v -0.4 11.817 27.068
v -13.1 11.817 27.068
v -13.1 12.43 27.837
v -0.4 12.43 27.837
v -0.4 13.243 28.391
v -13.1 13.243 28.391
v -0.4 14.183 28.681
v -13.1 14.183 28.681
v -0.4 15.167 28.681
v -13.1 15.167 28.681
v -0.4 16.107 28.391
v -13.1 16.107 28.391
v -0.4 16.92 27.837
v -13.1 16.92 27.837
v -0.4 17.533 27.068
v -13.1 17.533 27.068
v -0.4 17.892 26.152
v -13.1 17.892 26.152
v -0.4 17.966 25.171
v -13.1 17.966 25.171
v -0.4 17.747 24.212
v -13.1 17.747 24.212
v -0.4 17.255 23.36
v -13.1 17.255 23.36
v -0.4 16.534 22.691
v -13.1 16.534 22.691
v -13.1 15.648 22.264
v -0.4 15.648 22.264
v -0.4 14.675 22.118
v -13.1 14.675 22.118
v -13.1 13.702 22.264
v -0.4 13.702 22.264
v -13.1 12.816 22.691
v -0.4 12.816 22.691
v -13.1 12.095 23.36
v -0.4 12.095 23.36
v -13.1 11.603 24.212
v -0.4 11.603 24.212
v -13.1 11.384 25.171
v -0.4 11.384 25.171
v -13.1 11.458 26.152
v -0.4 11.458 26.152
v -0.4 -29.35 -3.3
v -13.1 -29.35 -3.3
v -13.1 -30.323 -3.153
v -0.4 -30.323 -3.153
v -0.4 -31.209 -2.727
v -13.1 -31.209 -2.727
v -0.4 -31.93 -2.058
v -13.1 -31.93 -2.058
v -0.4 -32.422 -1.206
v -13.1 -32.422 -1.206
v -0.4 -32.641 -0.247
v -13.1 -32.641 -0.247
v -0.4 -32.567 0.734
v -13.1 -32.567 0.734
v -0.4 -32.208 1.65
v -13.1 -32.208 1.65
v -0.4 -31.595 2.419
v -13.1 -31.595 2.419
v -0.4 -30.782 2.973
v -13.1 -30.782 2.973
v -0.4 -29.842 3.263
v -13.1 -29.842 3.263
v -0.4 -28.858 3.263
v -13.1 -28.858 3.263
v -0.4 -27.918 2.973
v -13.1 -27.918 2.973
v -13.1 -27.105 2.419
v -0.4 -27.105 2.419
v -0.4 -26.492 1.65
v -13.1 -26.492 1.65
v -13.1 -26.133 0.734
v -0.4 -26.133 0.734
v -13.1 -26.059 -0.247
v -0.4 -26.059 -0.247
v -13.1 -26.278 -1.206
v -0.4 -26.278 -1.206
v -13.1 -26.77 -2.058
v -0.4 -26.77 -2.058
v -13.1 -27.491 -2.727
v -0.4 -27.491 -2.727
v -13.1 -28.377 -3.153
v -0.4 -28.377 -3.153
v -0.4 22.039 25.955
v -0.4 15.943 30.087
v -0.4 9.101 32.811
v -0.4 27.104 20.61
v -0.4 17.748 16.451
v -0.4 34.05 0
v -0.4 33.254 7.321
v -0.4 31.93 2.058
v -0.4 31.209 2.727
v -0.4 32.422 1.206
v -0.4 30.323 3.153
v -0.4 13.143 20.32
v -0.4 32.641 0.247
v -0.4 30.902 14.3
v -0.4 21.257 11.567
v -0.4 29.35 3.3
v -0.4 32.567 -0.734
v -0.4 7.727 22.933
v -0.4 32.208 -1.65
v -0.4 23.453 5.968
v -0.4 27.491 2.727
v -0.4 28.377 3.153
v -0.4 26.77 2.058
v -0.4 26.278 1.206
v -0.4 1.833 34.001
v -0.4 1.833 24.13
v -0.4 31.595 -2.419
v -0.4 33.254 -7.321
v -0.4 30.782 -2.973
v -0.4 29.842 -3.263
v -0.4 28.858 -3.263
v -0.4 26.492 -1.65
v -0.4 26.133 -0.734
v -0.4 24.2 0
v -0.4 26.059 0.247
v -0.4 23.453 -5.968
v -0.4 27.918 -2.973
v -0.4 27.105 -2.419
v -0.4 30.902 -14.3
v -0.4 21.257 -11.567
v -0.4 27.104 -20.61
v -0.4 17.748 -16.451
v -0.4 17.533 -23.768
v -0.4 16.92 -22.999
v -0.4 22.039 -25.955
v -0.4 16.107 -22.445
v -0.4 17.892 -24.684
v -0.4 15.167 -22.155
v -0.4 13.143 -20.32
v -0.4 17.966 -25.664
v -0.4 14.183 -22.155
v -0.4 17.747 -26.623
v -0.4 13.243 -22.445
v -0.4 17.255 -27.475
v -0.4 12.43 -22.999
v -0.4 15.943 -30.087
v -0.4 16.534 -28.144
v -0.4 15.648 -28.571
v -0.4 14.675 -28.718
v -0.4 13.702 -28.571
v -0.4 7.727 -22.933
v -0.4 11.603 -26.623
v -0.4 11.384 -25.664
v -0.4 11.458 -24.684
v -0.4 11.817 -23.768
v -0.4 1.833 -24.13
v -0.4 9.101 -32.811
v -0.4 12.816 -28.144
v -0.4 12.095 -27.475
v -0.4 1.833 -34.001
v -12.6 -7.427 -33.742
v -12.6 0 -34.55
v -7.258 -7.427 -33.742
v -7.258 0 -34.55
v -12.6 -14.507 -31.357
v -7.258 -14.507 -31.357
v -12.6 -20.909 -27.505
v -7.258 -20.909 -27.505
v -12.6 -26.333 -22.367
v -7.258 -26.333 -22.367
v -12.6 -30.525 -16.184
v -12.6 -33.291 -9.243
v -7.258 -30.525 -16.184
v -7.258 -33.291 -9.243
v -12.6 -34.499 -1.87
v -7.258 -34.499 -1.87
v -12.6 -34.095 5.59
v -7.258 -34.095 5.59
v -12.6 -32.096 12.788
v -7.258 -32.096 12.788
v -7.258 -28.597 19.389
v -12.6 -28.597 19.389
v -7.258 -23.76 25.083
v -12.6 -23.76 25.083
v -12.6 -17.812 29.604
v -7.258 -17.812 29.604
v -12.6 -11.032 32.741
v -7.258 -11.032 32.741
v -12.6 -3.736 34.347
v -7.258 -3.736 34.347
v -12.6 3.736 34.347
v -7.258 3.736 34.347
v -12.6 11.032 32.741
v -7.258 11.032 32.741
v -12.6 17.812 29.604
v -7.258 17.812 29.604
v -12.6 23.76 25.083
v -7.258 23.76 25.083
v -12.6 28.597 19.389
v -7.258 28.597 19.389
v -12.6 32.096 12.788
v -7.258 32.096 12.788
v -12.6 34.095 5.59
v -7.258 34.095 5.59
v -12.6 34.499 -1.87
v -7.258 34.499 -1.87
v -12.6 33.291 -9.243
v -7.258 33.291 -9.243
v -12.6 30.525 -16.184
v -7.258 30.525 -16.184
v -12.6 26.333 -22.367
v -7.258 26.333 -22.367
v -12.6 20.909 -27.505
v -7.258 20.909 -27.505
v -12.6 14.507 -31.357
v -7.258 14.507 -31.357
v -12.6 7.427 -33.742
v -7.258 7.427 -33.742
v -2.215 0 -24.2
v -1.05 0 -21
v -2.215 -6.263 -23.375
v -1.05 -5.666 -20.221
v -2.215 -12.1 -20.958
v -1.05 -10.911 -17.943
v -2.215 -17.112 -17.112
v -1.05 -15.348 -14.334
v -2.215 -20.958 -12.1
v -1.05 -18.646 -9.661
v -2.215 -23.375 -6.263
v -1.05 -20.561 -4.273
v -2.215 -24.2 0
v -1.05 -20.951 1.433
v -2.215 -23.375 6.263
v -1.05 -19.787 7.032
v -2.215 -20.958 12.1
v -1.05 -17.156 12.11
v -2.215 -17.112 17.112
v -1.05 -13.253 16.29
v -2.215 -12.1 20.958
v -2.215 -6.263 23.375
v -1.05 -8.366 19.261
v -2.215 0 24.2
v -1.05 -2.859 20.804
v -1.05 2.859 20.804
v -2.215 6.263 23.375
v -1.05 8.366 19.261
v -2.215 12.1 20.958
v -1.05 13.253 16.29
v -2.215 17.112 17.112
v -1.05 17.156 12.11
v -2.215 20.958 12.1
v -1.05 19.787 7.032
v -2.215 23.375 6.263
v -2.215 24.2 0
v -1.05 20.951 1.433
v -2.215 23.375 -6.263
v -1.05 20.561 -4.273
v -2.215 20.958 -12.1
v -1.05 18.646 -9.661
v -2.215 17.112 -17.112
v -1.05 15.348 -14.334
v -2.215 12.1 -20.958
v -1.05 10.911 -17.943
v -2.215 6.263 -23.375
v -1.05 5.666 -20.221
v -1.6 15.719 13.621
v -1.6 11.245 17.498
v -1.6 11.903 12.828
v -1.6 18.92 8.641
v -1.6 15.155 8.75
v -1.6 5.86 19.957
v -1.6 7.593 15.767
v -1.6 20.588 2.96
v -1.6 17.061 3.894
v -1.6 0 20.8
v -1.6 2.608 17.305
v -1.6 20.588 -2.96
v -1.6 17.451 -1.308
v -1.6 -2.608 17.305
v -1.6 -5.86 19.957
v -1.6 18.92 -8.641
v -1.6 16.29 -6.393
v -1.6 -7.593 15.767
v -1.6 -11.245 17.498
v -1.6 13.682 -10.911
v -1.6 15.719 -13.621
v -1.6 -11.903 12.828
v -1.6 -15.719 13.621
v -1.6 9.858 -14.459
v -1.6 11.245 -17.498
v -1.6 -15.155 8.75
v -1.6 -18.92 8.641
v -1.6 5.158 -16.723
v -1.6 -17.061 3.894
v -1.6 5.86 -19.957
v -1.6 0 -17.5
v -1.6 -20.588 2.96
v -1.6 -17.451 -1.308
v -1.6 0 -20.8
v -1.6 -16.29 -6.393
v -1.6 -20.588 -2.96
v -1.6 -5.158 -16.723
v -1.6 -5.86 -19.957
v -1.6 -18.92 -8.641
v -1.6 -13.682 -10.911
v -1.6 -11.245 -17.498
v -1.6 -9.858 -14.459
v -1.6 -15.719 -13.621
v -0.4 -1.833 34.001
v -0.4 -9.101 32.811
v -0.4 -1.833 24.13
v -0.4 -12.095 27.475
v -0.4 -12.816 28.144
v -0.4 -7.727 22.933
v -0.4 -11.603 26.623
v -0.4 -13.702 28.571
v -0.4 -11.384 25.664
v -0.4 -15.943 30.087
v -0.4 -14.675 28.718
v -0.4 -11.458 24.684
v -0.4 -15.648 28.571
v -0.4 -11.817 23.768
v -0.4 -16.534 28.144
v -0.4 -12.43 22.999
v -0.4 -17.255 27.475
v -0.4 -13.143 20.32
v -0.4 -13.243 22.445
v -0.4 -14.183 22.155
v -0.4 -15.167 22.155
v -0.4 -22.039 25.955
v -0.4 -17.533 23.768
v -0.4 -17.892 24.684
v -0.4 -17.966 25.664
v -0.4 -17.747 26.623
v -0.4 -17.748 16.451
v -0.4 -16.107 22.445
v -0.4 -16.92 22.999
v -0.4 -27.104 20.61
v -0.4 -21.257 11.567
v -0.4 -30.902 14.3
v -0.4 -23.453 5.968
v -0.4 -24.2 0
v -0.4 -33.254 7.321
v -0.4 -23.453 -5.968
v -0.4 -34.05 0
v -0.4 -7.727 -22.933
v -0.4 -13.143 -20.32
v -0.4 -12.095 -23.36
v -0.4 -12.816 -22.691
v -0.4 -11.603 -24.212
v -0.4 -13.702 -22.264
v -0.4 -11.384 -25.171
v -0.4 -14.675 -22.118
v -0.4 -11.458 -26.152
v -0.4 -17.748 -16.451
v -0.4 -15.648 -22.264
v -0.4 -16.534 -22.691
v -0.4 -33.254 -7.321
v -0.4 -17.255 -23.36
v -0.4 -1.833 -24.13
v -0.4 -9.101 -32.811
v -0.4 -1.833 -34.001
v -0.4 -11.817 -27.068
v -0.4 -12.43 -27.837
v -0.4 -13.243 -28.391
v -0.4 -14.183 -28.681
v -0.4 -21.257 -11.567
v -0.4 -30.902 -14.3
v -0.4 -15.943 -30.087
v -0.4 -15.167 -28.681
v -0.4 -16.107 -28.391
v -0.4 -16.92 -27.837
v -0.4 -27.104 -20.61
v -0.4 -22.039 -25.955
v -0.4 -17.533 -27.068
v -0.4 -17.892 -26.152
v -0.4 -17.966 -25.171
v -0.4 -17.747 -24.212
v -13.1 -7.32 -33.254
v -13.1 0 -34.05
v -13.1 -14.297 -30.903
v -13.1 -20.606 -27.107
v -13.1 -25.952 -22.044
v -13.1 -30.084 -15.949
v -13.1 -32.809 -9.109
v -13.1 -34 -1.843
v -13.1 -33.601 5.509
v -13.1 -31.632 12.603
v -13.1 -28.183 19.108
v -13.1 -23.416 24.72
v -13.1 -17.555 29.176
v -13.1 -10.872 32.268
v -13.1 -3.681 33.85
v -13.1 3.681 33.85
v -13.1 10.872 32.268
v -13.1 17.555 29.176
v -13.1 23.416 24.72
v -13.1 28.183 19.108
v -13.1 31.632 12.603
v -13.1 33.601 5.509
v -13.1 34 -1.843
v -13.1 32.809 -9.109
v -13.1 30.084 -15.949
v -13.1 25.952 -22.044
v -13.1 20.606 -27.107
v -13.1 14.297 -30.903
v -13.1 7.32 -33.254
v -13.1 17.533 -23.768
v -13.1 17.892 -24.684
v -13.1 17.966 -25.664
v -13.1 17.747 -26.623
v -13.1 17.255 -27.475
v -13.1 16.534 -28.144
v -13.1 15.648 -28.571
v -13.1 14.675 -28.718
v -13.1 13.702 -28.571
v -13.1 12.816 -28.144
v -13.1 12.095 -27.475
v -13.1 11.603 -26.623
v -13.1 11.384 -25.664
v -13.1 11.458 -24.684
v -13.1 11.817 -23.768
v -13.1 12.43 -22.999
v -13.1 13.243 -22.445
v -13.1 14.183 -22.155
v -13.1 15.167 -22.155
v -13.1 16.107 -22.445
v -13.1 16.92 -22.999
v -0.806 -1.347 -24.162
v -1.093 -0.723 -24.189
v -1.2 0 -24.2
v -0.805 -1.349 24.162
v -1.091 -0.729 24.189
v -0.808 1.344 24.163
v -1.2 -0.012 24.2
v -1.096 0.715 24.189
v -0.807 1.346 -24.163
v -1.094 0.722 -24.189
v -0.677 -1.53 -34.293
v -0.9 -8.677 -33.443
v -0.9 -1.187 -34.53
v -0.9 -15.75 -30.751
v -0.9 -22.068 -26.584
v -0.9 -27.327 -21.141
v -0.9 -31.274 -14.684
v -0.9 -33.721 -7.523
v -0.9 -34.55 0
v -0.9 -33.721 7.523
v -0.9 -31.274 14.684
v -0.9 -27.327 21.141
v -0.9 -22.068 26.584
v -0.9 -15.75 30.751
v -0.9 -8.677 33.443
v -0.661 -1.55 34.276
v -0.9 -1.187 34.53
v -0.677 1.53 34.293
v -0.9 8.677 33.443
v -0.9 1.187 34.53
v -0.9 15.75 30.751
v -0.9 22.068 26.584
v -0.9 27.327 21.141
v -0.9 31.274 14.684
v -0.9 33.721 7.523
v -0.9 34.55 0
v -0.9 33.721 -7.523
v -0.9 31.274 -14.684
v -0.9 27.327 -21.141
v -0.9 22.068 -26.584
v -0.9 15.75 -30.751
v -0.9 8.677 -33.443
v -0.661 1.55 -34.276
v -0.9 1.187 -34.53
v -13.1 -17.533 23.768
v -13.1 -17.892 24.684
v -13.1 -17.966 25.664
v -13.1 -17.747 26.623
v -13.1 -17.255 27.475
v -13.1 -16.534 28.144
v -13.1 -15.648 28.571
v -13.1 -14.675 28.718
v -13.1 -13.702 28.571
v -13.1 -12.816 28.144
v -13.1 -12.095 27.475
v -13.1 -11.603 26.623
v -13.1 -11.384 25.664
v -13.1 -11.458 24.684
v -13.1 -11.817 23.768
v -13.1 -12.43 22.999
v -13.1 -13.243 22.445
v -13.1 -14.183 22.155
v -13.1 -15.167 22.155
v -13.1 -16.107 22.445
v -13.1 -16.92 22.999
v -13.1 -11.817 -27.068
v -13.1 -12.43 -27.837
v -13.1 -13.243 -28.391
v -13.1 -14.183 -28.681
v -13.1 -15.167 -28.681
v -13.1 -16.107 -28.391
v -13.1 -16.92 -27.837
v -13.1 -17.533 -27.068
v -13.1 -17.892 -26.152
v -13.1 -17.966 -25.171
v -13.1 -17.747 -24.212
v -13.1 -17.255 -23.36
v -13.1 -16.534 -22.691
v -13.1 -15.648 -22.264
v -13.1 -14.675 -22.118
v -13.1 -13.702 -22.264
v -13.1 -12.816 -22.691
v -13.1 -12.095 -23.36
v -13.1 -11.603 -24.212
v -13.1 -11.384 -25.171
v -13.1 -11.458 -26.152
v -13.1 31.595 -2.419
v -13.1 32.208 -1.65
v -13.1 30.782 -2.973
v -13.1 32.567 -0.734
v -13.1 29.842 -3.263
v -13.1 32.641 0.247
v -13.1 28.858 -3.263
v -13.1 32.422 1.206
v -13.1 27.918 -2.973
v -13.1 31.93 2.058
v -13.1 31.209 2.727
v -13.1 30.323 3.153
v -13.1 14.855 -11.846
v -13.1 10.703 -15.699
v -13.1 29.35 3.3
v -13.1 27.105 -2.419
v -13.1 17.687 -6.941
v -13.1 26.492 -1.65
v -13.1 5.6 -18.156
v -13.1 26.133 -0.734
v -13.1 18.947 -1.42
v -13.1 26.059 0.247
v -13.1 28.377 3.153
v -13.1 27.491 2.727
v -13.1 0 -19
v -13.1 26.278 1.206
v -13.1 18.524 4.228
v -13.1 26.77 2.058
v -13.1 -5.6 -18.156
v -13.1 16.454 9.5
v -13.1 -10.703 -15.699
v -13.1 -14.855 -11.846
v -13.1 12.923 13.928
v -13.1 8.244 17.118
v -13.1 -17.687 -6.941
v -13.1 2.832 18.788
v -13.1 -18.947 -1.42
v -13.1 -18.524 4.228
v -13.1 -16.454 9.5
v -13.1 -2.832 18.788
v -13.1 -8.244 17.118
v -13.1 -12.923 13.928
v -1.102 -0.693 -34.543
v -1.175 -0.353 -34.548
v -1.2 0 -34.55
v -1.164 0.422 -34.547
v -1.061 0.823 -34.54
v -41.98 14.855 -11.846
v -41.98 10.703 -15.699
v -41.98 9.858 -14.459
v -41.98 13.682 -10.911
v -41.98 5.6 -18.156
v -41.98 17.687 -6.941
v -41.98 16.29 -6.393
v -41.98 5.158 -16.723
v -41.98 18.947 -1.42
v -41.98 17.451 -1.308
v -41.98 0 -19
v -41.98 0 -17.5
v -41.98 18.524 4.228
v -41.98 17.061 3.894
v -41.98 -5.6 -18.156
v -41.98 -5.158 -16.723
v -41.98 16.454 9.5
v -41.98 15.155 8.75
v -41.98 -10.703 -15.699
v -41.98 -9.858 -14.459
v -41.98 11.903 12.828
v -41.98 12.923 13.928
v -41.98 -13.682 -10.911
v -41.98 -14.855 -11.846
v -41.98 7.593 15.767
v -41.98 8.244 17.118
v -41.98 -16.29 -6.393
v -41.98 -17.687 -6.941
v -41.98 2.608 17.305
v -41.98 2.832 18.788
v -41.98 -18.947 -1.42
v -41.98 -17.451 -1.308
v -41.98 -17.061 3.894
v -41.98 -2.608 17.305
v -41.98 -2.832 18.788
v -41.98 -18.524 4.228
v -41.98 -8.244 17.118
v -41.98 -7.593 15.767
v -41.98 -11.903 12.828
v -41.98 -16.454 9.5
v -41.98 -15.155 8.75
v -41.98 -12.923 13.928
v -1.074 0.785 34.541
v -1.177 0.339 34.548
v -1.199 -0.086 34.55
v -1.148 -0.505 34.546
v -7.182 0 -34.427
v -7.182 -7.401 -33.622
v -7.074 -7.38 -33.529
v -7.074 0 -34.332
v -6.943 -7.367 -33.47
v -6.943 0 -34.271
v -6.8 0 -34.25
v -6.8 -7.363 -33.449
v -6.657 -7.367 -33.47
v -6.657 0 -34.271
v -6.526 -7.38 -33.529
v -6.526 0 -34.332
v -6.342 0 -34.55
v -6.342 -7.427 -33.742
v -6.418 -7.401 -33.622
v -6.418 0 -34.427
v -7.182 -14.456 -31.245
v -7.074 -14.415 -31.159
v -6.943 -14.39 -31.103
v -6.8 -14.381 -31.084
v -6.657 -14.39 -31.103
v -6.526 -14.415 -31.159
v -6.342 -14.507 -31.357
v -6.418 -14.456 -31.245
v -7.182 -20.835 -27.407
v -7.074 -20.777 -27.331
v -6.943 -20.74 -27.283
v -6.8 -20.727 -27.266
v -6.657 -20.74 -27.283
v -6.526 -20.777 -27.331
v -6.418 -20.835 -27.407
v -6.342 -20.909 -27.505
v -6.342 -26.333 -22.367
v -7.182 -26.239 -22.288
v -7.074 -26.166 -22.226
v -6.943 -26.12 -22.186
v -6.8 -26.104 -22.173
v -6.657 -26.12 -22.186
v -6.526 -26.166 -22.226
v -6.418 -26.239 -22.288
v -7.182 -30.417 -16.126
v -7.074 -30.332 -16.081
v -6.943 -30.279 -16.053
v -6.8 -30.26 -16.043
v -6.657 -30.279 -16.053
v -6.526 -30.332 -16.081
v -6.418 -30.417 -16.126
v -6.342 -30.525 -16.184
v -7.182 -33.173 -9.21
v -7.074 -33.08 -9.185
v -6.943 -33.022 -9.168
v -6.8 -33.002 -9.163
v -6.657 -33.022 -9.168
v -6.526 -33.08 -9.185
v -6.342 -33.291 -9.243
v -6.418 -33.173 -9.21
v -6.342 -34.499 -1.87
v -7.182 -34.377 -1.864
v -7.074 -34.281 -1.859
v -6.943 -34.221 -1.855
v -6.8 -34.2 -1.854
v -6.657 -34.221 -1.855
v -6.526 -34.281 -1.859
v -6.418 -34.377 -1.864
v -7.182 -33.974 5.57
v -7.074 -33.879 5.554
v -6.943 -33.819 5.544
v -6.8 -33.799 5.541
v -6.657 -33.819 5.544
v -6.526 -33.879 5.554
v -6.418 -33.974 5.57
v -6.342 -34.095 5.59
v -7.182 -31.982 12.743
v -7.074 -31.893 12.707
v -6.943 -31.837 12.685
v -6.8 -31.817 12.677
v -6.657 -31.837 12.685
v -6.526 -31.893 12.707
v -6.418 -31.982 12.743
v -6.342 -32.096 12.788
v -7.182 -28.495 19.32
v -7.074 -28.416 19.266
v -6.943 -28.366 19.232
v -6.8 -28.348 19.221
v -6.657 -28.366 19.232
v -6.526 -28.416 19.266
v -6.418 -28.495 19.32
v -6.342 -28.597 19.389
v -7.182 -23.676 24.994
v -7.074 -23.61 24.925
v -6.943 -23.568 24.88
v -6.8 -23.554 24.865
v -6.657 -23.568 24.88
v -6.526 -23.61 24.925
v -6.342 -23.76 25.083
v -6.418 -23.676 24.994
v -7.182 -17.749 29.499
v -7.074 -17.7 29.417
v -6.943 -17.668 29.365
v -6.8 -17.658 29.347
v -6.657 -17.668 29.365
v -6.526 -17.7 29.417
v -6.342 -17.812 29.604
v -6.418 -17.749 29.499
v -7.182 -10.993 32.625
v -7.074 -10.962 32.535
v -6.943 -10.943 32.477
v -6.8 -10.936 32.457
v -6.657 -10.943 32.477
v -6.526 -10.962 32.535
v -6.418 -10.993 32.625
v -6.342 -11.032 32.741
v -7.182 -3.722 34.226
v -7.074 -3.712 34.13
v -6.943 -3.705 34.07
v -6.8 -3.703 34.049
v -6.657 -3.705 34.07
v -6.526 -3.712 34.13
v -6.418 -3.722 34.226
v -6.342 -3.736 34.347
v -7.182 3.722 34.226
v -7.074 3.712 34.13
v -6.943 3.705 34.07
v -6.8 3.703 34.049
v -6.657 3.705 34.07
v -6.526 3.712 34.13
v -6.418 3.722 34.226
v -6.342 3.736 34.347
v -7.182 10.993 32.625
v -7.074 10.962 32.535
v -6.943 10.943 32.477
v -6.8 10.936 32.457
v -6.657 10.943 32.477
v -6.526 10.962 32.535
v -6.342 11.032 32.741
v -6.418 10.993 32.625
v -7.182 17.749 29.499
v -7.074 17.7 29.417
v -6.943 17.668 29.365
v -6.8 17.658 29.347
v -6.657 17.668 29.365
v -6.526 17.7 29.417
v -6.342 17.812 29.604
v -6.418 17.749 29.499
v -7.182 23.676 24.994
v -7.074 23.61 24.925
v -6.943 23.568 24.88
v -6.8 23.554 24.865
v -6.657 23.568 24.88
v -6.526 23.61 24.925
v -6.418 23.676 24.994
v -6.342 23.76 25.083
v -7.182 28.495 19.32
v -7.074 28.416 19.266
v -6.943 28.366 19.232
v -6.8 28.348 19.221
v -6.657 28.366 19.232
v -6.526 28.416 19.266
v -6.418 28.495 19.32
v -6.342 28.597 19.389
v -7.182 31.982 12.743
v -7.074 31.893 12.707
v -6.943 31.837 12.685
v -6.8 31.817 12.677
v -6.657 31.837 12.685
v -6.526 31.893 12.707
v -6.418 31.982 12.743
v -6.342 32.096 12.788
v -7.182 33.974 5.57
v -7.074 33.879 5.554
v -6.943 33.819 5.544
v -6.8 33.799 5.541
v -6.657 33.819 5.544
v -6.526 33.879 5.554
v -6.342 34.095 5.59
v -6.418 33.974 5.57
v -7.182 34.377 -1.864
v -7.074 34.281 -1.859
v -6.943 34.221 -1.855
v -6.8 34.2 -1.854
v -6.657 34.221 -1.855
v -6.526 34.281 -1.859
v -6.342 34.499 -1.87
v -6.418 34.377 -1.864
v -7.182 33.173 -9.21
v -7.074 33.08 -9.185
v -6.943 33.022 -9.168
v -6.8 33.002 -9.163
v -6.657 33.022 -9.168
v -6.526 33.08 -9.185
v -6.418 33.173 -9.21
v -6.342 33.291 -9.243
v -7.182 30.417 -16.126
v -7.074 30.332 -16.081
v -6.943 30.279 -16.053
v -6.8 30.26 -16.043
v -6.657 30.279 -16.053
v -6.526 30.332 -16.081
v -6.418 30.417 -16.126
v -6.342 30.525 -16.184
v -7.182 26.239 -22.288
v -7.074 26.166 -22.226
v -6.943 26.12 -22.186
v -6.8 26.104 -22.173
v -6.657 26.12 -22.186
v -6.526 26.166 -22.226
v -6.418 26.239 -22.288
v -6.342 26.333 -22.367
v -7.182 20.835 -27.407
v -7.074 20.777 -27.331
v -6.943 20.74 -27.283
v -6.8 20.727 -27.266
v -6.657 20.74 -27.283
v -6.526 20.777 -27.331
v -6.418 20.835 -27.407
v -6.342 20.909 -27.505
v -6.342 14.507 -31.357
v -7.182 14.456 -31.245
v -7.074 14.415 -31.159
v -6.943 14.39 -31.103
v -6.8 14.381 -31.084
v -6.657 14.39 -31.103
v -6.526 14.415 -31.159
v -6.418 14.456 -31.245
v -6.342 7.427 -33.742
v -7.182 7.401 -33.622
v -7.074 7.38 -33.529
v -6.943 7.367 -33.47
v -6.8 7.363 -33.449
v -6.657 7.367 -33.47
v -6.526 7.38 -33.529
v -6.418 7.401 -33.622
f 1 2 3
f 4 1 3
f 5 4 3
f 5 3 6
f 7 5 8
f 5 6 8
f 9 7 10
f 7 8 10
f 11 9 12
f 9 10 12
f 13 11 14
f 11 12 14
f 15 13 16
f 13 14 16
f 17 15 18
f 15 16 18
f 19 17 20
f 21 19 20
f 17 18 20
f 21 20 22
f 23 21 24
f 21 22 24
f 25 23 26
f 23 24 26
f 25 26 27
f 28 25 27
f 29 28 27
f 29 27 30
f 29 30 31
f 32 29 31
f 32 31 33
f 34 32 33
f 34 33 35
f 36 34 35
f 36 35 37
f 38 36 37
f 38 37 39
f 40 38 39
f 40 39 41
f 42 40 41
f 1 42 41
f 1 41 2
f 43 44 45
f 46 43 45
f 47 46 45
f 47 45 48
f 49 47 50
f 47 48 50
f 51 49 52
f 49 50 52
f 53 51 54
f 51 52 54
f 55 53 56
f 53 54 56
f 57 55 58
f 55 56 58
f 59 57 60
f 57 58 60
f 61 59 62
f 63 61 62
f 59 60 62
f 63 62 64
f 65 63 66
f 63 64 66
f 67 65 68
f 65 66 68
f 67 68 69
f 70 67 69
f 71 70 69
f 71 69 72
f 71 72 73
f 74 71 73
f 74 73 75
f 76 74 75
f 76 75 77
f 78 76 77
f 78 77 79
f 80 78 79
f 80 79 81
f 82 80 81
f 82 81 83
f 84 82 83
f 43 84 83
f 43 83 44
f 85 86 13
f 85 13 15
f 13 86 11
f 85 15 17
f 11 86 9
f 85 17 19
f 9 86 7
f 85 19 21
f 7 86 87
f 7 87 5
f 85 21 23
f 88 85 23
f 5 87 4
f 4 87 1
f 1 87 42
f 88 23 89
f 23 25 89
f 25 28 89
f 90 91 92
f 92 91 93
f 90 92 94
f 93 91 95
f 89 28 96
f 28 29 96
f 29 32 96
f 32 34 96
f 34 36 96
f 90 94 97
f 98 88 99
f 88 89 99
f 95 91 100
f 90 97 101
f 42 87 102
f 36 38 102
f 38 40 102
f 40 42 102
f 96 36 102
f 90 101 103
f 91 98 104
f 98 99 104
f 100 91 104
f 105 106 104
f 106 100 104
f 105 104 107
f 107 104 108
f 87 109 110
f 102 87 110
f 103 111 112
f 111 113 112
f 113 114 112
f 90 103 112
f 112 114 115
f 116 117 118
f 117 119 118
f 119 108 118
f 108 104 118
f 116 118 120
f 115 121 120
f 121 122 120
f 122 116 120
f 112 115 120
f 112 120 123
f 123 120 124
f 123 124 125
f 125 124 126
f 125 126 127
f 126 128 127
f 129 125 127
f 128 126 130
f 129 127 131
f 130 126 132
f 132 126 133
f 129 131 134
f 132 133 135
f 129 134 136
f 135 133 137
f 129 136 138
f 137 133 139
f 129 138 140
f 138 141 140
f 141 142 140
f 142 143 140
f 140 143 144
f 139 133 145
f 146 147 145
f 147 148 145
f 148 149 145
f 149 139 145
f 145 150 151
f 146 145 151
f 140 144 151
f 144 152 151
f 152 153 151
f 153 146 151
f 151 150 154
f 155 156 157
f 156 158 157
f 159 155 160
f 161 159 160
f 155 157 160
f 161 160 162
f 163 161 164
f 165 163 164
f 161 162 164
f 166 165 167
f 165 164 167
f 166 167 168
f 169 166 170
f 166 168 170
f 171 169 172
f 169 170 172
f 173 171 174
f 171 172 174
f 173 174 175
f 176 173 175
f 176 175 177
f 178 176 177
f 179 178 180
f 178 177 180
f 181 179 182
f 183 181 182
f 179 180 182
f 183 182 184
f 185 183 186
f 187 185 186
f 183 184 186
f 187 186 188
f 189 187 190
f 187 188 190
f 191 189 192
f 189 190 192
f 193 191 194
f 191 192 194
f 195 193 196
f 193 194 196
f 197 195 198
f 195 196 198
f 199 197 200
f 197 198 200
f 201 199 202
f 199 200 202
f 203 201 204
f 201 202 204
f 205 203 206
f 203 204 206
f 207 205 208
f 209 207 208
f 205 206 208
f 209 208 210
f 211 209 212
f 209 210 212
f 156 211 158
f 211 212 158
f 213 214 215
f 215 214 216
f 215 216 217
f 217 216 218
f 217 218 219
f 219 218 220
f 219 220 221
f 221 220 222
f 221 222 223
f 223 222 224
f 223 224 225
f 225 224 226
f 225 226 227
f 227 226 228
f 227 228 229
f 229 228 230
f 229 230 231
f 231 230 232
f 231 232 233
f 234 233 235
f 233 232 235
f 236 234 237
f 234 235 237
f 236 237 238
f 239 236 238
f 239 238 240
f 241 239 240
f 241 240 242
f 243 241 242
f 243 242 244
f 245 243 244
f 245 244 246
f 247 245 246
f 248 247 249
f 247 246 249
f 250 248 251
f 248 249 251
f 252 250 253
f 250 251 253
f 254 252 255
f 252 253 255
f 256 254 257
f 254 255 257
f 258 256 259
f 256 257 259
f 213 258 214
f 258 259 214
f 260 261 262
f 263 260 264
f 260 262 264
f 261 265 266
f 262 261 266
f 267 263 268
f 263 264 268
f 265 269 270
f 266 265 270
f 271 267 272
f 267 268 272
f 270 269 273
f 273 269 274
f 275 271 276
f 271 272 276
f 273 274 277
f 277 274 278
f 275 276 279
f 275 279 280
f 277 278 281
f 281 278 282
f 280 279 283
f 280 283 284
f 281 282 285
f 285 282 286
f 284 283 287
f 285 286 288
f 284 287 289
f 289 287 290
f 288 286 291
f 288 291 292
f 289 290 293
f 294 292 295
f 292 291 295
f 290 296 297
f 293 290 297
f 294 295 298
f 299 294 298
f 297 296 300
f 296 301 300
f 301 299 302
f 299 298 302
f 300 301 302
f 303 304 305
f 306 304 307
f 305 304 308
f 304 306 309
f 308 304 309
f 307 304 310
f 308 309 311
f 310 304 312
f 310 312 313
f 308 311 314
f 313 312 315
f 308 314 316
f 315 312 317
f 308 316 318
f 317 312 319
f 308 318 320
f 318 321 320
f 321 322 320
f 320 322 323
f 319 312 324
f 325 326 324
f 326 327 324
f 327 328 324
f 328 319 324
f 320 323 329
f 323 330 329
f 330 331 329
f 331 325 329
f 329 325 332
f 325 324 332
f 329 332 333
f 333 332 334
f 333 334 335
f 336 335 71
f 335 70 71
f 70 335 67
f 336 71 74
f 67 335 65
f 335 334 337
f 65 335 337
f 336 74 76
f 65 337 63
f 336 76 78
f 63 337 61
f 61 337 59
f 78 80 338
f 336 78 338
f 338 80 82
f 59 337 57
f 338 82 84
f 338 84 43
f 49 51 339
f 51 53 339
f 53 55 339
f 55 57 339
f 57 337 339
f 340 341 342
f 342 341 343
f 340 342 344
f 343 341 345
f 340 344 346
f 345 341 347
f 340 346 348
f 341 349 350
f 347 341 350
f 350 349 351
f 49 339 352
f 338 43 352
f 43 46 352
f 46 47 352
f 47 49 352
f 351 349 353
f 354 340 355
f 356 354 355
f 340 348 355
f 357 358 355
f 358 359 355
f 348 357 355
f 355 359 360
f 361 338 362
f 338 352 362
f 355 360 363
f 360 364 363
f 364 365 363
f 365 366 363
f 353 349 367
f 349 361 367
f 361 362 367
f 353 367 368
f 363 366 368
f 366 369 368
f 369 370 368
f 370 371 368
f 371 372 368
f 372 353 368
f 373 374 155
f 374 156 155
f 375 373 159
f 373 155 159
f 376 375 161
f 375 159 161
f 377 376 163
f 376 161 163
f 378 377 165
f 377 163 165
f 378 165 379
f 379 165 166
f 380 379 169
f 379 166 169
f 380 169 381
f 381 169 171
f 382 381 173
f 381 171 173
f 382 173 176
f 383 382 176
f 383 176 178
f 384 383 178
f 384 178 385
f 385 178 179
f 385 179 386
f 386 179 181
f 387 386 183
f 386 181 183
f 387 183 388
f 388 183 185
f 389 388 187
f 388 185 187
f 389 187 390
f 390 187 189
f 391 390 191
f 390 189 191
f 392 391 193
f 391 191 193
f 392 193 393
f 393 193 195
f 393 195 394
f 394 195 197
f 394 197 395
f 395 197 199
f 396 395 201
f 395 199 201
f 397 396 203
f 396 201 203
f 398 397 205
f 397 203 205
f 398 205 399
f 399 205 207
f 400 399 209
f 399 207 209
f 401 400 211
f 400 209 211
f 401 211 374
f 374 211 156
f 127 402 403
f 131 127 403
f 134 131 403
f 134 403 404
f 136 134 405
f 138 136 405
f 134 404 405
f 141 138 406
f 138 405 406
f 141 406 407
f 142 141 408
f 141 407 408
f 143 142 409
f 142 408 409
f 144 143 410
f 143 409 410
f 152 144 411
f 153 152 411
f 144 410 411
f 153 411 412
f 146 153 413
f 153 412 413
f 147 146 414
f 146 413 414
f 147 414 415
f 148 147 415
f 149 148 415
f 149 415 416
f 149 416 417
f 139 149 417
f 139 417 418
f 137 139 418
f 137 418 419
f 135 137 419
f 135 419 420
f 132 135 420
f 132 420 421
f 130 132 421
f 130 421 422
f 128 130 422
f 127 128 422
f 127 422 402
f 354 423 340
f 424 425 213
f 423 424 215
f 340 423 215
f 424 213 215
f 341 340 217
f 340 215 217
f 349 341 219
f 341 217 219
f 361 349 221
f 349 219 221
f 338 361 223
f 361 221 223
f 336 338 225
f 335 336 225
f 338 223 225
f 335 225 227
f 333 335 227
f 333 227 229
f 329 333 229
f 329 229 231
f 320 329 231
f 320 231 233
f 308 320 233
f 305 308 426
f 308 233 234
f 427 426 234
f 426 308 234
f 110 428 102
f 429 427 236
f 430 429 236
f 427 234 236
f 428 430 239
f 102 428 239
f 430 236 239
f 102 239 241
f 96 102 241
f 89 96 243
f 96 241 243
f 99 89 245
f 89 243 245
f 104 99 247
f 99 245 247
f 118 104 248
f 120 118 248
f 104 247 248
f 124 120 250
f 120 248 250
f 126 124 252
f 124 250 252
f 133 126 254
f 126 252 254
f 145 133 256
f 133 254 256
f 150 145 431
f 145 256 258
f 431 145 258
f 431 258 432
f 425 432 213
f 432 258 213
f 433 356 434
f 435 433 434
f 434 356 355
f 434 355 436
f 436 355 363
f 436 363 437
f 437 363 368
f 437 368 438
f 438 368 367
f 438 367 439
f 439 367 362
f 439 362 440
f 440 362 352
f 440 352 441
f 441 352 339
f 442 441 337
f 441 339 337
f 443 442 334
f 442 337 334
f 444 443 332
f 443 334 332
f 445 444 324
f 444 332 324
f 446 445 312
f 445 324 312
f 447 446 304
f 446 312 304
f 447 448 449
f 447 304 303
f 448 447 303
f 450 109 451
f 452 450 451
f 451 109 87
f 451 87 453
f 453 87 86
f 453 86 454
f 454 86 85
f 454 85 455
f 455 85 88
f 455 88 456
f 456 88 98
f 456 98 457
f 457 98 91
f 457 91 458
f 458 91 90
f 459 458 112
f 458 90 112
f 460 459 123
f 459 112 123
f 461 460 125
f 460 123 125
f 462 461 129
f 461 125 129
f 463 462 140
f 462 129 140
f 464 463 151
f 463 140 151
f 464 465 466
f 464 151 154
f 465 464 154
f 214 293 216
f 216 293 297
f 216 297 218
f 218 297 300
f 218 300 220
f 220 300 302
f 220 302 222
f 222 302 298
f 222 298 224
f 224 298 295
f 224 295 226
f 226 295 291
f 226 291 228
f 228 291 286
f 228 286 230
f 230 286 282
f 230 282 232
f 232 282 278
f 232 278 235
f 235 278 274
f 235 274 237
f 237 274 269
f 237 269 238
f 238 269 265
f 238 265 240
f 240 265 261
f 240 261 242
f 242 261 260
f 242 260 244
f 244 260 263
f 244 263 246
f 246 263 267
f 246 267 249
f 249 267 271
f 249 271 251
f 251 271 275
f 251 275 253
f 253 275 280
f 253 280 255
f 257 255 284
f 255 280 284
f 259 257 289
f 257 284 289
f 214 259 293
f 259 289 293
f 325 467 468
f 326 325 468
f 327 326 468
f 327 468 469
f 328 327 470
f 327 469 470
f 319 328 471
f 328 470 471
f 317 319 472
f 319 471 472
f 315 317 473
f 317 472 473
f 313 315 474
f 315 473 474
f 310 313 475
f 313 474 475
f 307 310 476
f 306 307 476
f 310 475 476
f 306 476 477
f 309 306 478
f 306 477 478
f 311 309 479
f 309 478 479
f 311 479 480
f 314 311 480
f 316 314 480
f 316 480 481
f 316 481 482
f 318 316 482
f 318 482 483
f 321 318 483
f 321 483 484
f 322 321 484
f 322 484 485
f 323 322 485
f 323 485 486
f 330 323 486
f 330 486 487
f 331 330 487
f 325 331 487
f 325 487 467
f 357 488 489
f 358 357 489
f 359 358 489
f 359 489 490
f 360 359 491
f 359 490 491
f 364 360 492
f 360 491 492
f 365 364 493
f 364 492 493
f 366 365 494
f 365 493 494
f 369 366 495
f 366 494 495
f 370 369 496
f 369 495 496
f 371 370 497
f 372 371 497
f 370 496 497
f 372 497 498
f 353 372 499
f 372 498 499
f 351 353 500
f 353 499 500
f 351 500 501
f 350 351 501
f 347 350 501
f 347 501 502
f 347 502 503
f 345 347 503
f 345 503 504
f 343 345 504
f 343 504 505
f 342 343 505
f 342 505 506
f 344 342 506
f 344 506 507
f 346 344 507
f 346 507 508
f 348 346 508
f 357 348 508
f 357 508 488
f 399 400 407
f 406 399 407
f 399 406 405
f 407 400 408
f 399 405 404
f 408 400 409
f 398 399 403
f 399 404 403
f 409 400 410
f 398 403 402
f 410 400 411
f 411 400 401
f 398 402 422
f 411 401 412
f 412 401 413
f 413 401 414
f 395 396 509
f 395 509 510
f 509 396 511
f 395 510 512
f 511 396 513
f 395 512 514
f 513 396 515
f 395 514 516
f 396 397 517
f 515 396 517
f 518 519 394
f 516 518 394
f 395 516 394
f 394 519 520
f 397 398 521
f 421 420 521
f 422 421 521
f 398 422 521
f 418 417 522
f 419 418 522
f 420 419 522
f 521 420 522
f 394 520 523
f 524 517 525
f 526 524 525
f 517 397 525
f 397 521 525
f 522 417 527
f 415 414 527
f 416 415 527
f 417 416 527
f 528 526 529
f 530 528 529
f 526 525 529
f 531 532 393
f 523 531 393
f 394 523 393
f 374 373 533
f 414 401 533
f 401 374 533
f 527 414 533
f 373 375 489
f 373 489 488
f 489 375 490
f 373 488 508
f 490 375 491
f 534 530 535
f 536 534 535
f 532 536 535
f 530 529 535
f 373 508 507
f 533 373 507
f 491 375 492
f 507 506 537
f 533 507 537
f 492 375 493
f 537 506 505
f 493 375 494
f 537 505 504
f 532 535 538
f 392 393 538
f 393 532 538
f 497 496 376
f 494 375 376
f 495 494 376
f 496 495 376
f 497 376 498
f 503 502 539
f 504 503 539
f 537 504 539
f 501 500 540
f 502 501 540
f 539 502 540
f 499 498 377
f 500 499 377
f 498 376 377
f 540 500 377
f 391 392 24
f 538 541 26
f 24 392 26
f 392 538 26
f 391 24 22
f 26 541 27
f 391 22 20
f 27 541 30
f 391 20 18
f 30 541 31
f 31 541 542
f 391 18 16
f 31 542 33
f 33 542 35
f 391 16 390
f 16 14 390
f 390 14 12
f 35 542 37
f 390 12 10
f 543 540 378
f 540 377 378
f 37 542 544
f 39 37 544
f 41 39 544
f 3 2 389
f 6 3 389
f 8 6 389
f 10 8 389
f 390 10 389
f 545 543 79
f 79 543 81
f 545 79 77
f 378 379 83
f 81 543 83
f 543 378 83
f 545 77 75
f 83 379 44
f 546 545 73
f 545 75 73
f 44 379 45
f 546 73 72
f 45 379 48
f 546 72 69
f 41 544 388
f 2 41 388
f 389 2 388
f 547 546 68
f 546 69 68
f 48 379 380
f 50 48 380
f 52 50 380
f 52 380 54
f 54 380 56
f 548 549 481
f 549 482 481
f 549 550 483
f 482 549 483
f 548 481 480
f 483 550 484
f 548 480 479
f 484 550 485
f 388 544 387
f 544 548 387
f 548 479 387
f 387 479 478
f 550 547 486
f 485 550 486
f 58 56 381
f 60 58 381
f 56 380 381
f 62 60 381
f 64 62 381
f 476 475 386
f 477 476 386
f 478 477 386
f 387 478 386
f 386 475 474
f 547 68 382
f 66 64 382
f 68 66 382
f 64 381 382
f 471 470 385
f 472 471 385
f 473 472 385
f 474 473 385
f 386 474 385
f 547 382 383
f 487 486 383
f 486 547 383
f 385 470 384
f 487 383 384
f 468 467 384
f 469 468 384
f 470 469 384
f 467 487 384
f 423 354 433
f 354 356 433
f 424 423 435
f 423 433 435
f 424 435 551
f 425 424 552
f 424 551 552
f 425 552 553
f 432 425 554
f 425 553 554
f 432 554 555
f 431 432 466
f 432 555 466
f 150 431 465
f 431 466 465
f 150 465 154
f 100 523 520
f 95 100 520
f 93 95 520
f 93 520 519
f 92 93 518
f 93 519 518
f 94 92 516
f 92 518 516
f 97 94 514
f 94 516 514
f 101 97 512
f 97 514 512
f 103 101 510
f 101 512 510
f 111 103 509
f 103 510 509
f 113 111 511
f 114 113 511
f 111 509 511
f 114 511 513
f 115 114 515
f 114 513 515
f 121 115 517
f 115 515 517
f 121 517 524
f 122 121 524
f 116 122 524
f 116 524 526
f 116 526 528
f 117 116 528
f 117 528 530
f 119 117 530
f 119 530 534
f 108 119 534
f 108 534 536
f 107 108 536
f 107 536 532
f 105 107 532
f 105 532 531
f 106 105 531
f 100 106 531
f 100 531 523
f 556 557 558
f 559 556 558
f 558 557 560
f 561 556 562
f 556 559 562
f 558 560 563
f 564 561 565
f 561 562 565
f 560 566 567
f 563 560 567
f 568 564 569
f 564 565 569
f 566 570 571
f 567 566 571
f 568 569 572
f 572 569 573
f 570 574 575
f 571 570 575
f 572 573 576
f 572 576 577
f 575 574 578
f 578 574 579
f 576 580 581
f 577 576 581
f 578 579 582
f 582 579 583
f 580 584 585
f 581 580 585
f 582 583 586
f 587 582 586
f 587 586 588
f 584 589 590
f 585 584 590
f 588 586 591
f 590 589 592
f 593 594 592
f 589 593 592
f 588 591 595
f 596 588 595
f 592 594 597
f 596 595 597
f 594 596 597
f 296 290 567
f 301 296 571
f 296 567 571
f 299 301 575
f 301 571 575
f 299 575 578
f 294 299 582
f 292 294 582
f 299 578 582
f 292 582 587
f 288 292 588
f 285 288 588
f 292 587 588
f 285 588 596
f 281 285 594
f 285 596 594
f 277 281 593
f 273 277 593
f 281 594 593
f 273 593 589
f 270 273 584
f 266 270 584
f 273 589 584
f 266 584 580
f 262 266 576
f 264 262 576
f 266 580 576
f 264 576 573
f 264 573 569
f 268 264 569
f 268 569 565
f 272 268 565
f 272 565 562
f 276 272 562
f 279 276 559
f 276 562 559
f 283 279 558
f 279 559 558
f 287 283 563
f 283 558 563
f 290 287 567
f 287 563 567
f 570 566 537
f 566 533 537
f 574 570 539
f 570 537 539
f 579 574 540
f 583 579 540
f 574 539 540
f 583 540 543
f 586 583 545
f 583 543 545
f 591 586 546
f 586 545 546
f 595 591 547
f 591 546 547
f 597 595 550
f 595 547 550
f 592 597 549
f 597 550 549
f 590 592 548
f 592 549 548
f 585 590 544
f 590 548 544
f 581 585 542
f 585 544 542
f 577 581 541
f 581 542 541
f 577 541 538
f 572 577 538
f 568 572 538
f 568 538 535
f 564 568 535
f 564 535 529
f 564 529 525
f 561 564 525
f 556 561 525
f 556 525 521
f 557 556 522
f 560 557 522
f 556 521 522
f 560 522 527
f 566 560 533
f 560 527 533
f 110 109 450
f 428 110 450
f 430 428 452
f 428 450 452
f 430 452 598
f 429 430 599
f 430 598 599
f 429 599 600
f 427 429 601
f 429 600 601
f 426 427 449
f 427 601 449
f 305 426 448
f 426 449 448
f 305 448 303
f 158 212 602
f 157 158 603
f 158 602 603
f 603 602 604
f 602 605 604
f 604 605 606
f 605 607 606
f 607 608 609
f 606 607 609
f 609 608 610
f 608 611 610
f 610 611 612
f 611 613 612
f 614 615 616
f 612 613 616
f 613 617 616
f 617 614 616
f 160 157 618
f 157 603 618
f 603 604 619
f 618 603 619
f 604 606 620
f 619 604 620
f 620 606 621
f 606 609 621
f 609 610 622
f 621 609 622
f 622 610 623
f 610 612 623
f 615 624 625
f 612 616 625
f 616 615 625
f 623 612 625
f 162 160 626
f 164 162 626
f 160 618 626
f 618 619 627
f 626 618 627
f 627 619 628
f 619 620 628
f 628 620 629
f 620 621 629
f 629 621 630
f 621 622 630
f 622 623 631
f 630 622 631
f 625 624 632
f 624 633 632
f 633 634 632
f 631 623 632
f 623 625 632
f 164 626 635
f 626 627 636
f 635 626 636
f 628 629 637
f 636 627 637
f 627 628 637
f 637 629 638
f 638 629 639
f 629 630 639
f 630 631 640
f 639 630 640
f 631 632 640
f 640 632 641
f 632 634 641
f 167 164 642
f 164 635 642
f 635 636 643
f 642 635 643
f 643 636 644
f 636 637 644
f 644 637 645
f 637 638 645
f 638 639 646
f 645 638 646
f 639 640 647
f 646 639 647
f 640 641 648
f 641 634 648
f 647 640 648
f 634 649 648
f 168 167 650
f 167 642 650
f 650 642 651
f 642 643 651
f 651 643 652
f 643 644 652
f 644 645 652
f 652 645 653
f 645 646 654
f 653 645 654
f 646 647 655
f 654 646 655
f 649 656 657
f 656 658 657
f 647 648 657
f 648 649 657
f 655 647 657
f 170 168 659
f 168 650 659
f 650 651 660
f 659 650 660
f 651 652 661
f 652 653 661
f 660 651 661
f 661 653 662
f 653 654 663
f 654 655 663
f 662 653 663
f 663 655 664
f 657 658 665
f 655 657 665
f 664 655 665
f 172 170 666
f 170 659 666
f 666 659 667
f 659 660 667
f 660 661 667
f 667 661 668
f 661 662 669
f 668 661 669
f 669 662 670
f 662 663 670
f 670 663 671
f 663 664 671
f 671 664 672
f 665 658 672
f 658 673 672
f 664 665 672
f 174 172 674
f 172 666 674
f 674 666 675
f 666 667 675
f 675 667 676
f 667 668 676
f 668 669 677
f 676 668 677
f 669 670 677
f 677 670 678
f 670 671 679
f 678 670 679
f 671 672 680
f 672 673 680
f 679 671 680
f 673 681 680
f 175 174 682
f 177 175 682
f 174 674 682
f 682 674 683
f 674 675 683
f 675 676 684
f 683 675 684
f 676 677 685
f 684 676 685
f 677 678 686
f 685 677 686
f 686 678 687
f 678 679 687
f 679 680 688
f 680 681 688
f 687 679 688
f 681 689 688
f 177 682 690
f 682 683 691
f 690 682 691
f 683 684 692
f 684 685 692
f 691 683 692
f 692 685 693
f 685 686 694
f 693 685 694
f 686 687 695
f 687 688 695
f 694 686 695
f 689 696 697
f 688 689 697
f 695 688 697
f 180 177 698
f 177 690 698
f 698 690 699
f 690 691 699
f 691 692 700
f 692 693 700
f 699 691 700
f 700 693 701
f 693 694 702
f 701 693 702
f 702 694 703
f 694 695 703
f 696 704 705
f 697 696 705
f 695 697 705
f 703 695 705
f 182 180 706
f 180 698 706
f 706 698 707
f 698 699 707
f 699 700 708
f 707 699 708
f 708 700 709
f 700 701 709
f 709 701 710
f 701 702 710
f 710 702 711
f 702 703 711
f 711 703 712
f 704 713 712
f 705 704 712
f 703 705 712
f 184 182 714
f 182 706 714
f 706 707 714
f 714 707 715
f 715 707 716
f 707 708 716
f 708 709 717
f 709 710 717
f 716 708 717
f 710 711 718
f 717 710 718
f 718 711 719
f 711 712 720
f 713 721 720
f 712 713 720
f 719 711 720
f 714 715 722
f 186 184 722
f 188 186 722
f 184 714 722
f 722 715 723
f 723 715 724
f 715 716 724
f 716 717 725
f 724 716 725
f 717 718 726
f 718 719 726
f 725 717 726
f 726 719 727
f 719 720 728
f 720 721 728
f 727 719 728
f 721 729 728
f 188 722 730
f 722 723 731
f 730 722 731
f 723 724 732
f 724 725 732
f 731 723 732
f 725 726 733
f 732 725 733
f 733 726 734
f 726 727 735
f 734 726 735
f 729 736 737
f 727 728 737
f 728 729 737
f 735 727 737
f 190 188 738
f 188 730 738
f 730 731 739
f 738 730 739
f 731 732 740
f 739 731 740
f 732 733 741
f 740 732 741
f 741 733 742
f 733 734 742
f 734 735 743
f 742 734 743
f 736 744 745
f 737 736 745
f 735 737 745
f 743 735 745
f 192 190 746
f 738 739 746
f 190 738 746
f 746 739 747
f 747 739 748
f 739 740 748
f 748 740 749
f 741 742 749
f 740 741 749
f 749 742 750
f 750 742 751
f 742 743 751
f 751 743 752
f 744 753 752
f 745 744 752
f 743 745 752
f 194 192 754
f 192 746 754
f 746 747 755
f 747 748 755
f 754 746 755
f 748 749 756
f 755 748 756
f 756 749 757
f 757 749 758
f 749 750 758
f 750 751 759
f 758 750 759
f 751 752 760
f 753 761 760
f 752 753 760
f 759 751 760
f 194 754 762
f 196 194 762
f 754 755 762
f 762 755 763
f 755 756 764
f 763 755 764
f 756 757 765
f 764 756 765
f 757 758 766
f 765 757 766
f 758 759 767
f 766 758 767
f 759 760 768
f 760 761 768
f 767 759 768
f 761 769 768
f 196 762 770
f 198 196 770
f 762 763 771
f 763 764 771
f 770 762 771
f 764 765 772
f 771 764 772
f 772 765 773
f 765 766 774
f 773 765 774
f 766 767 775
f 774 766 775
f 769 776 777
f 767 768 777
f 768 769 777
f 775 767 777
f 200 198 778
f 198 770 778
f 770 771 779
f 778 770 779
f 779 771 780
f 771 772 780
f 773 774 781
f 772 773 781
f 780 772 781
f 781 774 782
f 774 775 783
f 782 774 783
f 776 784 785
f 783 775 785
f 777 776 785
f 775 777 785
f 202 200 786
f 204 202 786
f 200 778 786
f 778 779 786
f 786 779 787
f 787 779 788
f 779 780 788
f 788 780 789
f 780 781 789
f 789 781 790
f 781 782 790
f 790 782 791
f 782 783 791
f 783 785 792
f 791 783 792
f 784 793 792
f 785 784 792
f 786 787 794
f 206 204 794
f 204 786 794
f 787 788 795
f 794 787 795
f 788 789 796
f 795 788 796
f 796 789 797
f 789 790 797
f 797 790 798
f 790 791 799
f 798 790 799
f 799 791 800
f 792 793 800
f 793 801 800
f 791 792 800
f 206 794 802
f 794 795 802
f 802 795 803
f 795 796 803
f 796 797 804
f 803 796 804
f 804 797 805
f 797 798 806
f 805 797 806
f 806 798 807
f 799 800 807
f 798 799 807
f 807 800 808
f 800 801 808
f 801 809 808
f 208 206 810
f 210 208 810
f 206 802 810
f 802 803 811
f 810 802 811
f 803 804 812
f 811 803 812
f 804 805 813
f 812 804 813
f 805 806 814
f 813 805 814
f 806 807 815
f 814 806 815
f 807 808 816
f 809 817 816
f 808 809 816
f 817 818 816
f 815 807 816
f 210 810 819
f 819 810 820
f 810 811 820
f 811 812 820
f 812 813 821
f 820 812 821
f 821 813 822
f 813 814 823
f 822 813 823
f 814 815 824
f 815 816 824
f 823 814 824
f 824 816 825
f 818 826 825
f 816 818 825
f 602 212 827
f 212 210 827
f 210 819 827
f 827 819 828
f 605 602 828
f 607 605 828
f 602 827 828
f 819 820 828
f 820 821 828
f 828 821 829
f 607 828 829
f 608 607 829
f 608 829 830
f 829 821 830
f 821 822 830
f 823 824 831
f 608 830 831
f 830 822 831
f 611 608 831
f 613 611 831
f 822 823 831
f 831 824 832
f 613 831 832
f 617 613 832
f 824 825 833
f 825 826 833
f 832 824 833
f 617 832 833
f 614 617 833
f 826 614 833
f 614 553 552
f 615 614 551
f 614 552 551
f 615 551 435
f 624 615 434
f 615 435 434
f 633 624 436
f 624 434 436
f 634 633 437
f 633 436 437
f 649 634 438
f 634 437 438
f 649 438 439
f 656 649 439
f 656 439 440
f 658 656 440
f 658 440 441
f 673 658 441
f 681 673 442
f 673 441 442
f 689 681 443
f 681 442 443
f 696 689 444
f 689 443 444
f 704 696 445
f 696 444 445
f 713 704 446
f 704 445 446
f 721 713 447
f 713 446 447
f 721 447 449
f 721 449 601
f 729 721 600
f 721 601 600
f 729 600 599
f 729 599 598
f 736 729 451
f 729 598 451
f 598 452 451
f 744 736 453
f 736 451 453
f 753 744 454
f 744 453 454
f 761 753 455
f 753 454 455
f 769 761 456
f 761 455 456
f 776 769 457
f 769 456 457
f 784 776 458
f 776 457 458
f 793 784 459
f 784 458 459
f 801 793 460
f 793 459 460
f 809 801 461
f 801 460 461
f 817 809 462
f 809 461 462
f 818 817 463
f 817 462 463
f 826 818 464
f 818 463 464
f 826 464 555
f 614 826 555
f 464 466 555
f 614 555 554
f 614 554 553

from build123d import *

# Parameters (mm, degrees)
HOLE_WIZARD_M61_D        = 6.6
PATTERN_CIRCULAR_3_COUNT = 6
SKETCH_6_R               = 2.5
CUT_EXTRUDE_1_DEPTH      = 12
PATTERN_CIRCULAR_2_COUNT = 2
SKETCH_7_W               = 21.42
SKETCH_7_H               = 1.5


with BuildPart() as part:
    # Эскиз1 → Повернуть2 (revolve)
    with BuildSketch(Plane.XY):
        with BuildLine():
            Line((-7.258257569, 34.55), (-12.6, 34.55))
            Line((-12.6, 34.55), (-13.1, 34.05))
            Line((-13.1, 34.05), (-13.1, 19))
            Line((-13.1, 19), (-63.4, 19))
            Line((-63.4, 19), (-63.4, 17.5))
            Line((-63.4, 17.5), (-1.6, 17.5))
            Line((-1.6, 17.5), (-1.6, 20.799816371))
            Line((-1.6, 20.799816371), (-1.05, 21))
            Line((-1.05, 21), (-2.21470475, 24.2))
            Line((-2.21470475, 24.2), (-0.4, 24.2))
            Line((-0.4, 24.2), (-0.4, 34.05))
            Line((-0.4, 34.05), (-0.9, 34.55))
            Line((-0.9, 34.55), (-6.341742431, 34.55))
            ThreePointArc((-6.341742431, 34.55), (-6.8, 34.25), (-7.258257569, 34.55))
        make_face()
    revolve(axis=Axis((0, 0, 0), (-1, 0, 0)))

    # Отверстие с зазором M61 (through all)
    with Locations(Plane(origin=(-0.4, 0, 0), x_dir=(0, 0, -1), z_dir=(1, 0, 0))):
        with Locations((0, 29.35)):
            hole_wizard_m61 = Hole(HOLE_WIZARD_M61_D / 2)

    # Круговой массив3: Отверстие с зазором M61 ×6 about axis
    pattern_circular_3_axis = Axis((-110.150658921, 0, 0), (1, 0, 0))
    for i in range(1, PATTERN_CIRCULAR_3_COUNT):
        add(hole_wizard_m61.rotate(pattern_circular_3_axis, i * 360 / PATTERN_CIRCULAR_3_COUNT), mode=Mode.SUBTRACT)

    # Эскиз6 → Вырез-Вытянуть1 (cut)
    with BuildSketch(Plane(origin=(0, 0, -34.55), x_dir=(-1, 0, 0), z_dir=(0, 0, -1))):
        with Locations((-1.3, 0)):
            Circle(SKETCH_6_R)
    cut_extrude_1 = extrude(amount=-CUT_EXTRUDE_1_DEPTH, mode=Mode.SUBTRACT)

    # Круговой массив2: Вырез-Вытянуть1 ×2 about axis
    pattern_circular_2_axis = Axis((-110.150658921, 0, 0), (1, 0, 0))
    for i in range(1, PATTERN_CIRCULAR_2_COUNT):
        add(cut_extrude_1.rotate(pattern_circular_2_axis, i * 360 / PATTERN_CIRCULAR_2_COUNT), mode=Mode.SUBTRACT)

    # Эскиз7 → Вырез-Повернуть1 (revolve, cut)
    with BuildSketch(Plane.XY):
        with Locations((-52.69, 18.25)):
            Rectangle(SKETCH_7_W, SKETCH_7_H)
    revolve(axis=Axis((0, 0, 0), (-1, 0, 0)), mode=Mode.SUBTRACT)


solid = part.part
